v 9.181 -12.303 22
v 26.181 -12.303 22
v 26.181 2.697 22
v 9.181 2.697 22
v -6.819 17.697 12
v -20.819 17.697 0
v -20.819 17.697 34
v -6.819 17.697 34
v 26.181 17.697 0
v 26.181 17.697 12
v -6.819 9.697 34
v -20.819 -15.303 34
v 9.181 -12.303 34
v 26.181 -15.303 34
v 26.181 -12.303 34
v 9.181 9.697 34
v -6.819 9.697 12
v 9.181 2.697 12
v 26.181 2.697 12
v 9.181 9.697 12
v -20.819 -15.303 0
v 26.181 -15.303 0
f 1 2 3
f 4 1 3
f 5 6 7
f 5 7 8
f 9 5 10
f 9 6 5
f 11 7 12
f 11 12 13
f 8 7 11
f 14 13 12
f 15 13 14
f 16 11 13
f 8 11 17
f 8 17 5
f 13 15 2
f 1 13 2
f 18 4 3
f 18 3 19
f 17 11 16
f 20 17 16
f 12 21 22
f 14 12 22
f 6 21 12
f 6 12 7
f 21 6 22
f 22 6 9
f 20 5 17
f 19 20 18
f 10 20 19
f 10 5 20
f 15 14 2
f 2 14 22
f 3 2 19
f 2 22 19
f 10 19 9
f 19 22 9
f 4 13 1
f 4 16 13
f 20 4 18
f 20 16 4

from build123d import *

# Parameters (mm, degrees)
SKETCH1_W           = 47
SKETCH1_H           = 33
BOSS_EXTRUDE1_DEPTH = 34
SKETCH2_W           = 33
SKETCH2_H           = 8
CUT_EXTRUDE1_DEPTH  = 22
SKETCH3_W           = 12
SKETCH3_H           = 15
CUT_EXTRUDE2_DEPTH  = 17


with BuildPart() as part:
    # Sketch1 → Boss-Extrude1 (new body)
    with BuildSketch(Plane.XY):
        with Locations((2.68144213, 1.197180866)):
            Rectangle(SKETCH1_W, SKETCH1_H)
    extrude(amount=BOSS_EXTRUDE1_DEPTH)

    # Sketch2 → Cut-Extrude1 (cut)
    with BuildSketch(Plane.XY.offset(34)):
        with Locations((9.68144213, 13.697180866)):
            Rectangle(SKETCH2_W, SKETCH2_H)
    extrude(amount=-CUT_EXTRUDE1_DEPTH, mode=Mode.SUBTRACT)

    # Sketch3 → Cut-Extrude2 (cut)
    with BuildSketch(Plane(origin=(26.18144213, 0, 0), x_dir=(0, 0, -1), z_dir=(1, 0, 0))):
        with Locations((-28, -4.802819134)):
            Rectangle(SKETCH3_W, SKETCH3_H)
        Polygon((-12, 2.697180866), (-12, 9.697180866), (-34, 9.697180866), (-34, 2.697180866), (-22, 2.697180866), align=None)
    extrude(amount=-CUT_EXTRUDE2_DEPTH, mode=Mode.SUBTRACT)


solid = part.part
